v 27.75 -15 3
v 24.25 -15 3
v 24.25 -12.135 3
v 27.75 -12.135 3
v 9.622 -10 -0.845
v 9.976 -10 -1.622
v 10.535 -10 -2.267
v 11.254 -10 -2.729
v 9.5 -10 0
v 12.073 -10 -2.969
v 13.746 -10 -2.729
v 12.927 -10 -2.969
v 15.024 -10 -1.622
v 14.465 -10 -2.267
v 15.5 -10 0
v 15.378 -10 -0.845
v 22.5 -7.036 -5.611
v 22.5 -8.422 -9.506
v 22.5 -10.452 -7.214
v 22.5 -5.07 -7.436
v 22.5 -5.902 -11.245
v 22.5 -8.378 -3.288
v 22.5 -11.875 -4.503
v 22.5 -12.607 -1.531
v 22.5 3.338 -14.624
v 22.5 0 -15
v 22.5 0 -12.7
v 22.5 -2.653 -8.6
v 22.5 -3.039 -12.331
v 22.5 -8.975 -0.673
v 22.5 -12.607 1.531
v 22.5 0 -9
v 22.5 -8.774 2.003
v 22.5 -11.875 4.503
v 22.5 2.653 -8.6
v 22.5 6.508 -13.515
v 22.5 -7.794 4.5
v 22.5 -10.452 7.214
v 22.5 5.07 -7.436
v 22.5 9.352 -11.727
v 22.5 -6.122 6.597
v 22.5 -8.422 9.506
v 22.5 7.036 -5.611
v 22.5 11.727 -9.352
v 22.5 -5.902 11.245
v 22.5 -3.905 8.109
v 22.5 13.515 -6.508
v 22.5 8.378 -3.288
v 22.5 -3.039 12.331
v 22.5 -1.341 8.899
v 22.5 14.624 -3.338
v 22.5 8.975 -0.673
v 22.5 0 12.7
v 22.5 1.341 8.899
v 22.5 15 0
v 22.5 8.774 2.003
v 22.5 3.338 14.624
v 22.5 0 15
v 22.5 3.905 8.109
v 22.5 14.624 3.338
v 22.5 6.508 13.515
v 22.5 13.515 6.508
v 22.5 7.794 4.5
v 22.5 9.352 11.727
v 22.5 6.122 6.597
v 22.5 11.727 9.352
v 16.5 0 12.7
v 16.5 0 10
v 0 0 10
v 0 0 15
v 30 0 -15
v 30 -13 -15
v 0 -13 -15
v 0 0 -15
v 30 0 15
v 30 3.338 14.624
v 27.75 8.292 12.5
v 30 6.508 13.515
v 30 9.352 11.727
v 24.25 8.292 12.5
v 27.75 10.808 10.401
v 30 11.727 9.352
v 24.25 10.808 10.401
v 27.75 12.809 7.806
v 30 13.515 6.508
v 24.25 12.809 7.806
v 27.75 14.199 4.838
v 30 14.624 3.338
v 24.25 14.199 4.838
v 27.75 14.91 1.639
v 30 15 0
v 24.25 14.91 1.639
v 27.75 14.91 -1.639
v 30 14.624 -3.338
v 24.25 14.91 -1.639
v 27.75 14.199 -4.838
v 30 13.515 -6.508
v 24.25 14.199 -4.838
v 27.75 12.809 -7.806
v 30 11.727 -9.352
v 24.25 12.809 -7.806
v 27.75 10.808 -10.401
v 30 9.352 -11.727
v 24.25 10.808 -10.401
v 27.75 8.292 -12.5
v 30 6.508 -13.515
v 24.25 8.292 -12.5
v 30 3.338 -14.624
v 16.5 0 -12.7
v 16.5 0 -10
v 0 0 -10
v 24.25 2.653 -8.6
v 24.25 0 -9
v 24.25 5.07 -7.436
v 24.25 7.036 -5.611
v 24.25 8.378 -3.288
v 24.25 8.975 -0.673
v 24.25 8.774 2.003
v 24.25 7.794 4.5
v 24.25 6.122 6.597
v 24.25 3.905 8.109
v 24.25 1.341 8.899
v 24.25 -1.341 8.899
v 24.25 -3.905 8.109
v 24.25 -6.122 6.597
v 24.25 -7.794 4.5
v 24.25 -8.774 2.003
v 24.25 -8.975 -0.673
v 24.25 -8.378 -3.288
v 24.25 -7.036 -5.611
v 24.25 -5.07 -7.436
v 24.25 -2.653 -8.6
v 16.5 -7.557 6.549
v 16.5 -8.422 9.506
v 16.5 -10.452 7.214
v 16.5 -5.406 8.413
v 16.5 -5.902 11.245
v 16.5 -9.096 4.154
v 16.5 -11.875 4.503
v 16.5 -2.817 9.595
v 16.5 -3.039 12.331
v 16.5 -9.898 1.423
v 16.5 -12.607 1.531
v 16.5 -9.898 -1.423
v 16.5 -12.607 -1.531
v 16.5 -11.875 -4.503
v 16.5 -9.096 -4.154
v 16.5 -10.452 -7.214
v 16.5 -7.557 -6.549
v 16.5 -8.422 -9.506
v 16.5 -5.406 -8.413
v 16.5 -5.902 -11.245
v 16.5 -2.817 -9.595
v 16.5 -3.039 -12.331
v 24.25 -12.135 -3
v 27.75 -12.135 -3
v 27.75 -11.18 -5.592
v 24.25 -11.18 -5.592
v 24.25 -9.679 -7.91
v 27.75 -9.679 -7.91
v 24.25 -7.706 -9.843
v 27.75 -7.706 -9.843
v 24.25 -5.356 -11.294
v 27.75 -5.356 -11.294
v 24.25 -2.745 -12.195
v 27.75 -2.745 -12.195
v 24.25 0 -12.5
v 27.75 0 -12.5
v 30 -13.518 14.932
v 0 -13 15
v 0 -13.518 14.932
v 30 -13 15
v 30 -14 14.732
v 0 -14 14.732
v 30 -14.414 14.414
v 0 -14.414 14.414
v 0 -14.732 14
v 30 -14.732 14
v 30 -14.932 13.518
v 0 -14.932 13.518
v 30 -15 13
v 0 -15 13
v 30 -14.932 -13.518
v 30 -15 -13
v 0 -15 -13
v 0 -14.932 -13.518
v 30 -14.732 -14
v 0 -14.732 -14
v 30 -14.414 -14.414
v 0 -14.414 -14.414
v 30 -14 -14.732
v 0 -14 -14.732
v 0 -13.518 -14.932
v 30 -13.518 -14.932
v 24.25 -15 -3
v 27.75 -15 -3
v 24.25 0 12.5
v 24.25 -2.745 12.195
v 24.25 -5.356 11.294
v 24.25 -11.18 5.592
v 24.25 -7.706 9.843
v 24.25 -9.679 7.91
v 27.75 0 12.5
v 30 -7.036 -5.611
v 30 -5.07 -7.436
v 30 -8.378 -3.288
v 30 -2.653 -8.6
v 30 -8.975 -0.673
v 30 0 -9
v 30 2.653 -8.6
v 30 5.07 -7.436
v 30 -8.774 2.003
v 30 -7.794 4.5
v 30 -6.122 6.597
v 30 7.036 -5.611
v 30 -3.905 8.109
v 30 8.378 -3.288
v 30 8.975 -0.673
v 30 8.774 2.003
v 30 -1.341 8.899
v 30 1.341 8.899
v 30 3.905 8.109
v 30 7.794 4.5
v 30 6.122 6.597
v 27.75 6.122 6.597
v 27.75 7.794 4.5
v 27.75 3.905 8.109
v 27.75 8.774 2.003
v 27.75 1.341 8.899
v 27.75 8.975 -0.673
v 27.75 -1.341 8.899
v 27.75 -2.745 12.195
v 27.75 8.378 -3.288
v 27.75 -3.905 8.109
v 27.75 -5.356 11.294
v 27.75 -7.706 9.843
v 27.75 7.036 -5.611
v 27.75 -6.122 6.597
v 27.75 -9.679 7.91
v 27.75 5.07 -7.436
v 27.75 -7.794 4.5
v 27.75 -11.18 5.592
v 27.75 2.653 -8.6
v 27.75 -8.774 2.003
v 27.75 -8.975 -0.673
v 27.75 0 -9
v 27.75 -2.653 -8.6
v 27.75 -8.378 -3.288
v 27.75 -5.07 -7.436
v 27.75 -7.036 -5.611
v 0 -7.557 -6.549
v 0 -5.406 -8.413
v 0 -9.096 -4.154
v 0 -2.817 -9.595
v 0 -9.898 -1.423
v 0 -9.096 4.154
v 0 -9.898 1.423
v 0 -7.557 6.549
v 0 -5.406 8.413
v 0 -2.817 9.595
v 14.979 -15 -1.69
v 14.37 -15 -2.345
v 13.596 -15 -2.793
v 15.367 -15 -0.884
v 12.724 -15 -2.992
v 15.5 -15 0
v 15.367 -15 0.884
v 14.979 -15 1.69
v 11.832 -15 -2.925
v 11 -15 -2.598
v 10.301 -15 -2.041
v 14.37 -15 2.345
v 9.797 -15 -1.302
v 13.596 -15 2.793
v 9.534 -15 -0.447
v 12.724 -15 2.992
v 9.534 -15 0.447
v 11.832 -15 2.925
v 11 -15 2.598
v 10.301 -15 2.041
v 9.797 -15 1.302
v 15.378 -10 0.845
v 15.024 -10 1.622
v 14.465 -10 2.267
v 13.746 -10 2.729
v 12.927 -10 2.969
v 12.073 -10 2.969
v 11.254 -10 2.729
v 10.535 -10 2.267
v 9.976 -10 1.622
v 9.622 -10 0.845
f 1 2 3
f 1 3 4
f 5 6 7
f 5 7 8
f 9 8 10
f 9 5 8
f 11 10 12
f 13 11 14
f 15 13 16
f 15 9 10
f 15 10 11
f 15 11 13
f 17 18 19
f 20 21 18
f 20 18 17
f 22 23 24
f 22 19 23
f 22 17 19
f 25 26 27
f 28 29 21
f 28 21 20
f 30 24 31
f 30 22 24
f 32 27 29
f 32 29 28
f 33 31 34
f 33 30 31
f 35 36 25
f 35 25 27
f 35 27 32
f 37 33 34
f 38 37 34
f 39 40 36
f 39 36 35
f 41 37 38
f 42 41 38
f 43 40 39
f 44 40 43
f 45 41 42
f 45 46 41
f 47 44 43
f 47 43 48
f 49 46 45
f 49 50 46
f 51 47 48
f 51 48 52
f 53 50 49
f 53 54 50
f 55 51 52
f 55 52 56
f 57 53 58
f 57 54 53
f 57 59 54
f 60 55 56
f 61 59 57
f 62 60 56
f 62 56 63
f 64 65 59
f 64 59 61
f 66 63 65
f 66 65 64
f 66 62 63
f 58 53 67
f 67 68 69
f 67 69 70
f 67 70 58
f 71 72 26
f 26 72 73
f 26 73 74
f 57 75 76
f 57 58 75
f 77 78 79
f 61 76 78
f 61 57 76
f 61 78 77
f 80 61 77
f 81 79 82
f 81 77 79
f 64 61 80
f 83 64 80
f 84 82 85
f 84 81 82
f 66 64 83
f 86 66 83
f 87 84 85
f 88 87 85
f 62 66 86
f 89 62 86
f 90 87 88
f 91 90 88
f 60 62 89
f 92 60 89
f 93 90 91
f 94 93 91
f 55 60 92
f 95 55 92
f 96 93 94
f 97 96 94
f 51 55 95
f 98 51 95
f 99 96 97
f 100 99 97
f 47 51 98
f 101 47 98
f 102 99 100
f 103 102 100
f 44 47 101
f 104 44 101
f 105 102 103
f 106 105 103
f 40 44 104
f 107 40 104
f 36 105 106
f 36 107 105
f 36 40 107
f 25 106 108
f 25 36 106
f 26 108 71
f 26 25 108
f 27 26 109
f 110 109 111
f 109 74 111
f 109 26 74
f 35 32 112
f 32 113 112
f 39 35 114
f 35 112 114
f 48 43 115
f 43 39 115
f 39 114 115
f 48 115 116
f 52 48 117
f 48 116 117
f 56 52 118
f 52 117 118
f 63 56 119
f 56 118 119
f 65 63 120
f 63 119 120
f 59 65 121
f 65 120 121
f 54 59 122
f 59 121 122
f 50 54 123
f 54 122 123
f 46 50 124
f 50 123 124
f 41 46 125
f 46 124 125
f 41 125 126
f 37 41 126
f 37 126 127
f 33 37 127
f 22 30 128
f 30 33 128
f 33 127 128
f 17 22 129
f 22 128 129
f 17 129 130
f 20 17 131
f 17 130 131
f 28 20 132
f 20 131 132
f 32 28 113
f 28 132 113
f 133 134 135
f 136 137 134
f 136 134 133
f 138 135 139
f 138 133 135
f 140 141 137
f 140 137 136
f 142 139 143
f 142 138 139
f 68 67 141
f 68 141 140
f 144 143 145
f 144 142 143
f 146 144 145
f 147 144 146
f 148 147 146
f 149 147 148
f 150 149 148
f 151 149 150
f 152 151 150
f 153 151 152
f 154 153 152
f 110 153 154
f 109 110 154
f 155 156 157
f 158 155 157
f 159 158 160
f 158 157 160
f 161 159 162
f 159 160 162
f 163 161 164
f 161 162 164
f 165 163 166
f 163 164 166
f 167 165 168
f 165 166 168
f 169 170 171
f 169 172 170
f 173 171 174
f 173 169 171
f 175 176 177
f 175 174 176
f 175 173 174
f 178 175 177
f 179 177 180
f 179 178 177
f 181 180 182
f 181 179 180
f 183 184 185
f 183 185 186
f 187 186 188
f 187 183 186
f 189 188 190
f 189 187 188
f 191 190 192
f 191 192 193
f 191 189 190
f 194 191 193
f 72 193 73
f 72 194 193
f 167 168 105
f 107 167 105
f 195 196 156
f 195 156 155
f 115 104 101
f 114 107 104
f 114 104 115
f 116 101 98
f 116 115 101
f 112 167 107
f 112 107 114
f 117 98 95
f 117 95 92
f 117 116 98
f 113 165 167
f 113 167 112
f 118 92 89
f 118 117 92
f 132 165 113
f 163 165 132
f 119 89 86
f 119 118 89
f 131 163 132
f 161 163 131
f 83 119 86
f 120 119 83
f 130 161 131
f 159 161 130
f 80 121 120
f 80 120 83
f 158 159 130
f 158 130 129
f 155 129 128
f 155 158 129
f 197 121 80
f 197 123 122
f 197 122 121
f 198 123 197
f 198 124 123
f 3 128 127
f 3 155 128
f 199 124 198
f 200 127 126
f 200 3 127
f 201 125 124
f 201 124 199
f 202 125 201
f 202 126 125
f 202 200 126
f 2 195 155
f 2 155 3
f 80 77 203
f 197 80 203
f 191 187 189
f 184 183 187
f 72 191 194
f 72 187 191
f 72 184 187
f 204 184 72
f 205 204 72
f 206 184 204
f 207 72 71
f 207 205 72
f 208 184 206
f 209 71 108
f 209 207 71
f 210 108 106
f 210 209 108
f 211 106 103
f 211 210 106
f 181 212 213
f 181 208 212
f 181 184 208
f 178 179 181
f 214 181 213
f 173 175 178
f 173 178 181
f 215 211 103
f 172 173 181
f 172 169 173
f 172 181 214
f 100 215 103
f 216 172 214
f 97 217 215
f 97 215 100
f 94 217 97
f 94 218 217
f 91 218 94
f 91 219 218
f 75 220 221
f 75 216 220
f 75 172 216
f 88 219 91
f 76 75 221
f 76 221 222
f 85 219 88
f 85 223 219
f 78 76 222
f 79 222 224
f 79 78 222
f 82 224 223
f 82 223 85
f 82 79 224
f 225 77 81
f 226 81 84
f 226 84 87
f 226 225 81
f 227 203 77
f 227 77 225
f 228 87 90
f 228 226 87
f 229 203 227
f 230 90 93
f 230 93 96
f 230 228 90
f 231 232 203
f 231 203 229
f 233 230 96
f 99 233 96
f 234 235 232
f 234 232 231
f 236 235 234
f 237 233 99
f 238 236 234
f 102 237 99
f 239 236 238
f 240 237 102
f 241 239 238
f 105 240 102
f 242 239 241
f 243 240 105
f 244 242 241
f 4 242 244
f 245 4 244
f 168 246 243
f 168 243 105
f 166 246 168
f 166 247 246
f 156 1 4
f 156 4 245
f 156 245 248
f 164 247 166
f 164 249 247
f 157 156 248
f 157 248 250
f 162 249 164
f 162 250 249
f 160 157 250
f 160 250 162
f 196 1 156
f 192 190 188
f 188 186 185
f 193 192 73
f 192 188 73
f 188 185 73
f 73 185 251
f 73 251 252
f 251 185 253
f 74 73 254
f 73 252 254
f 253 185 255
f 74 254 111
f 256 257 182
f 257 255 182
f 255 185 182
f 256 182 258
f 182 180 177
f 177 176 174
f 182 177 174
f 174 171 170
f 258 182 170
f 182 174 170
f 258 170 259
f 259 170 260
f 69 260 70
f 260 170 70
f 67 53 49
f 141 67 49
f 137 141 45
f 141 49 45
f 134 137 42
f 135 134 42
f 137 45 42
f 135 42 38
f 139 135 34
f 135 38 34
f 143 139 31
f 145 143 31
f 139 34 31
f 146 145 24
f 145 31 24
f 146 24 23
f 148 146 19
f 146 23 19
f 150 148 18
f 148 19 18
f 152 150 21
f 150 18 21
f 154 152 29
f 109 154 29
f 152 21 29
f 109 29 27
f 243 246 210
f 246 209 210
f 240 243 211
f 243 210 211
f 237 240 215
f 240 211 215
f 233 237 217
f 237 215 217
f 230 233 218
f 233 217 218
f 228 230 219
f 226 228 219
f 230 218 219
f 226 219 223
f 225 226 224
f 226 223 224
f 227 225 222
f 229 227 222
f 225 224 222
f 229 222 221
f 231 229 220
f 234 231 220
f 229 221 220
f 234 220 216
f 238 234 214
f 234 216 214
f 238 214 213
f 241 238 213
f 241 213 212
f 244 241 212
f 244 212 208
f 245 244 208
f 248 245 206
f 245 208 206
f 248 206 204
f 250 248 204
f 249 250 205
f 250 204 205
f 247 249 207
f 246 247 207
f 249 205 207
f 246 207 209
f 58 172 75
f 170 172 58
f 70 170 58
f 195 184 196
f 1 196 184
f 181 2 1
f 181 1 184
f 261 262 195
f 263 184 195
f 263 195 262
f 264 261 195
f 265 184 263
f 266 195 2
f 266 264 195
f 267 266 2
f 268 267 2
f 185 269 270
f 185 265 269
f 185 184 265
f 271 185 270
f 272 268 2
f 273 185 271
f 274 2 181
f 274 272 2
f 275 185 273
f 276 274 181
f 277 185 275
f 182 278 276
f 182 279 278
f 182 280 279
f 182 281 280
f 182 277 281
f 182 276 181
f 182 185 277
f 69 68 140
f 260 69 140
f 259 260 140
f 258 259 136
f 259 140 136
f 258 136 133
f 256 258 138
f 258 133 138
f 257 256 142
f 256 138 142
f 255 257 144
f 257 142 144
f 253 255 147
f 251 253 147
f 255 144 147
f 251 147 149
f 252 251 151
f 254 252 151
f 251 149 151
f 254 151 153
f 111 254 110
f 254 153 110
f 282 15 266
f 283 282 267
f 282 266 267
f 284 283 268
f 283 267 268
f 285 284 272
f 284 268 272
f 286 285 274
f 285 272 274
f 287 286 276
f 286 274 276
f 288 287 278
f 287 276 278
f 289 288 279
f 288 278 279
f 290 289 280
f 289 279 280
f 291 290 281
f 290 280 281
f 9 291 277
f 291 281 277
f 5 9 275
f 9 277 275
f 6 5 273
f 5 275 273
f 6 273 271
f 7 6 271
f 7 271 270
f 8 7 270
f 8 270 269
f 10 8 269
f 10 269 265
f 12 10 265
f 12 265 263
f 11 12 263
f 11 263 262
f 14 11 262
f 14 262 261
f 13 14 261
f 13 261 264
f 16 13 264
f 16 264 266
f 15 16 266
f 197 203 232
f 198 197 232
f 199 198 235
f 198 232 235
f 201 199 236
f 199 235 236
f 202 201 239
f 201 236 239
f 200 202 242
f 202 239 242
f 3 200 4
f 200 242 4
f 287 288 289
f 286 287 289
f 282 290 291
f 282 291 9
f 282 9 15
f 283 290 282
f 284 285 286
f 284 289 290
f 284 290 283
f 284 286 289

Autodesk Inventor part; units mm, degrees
ref_plane "YZ Plane" through (0, 0, 0) normal (1, 0, 0) x (0, 1, 0)
ref_plane "XZ Plane" through (0, 0, 0) normal (0, 1, 0) x (-1, 0, 0)
ref_plane "XY Plane" through (0, 0, 0) normal (0, 0, 1) x (1, 0, 0)
sketch "スケッチ1" plane through (0, 0, 0) normal (1, 0, 0) x (0, 1, 0)
  line L0 (-15, 0) -> (-15, 15)
  line L1 (-15, 15) -> (0, 15)
  line L2 (-15, 0) -> (-15, -15)
  line L3 (-15, -15) -> (0, -15)
  arc A0 (0, -15) -> (0, 15) centre (0, 0) ccw
  dimension "d0" = 15
  dimension "d1" = 15
  dimension "d2" = 15
  dimension "d3" = 15
  dimension "d4" = 30
extrude "押し出し1" add sketch "スケッチ1" along normal blind 30
sketch "スケッチ2" plane through (30, 0, 0) normal (1, 0, 0) x (0, 0, -1)
  circle A0 centre (0, 0) radius 9
  dimension "d7" = 18
extrude "押し出し2" cut sketch "スケッチ2" against normal blind 7.5
sketch "スケッチ3" plane through (22.5, 0, 0) normal (1, 0, 0) x (0, 0, -1)
  circle A0 centre (0, 0) radius 12.7
  dimension "d10" = 25.4
extrude "押し出し3" cut sketch "スケッチ3" against normal blind 6
sketch "スケッチ4" plane through (16.5, 0, 0) normal (1, 0, 0) x (0, 0, -1)
  circle A0 centre (0, 0) radius 10
  dimension "d13" = 20
extrude "押し出し4" cut sketch "スケッチ4" against normal through all
sketch "スケッチ5" plane through (0, 0, 0) normal (-1, 0, 0) x (0, 0, 1)
  arc A0 (15, 0) -> (-15, 0) centre (0, 0) ccw
  line L0 (-15, 0) -> (15, 0)
  dimension "d16" = 30
extrude "押し出し5" cut sketch "スケッチ5" against normal blind 22.5
sketch "スケッチ6" plane through (30, 0, 0) normal (1, 0, 0) x (0, 0, -1)
  arc A0 (-12.5, 0) -> (12.5, 0) centre (0, 0) ccw
  arc A1 (15, 0) -> (-15, 0) centre (0, 0) ccw projected
  line L0 (-12.5, 0) -> (12.5, 0)
  line L1 (12.5, 0) -> (12.5, 20)
  line L2 (12.5, 20) -> (-12.5, 20)
  line L3 (-12.5, 20) -> (-12.5, 0)
  point P0 (12.5, 8.2916)
  point P1 (-12.5, 8.2916)
  dimension "d19" = 25
  dimension "d20" = 25
  dimension "d21" = 20
extrude "押し出し6" cut sketch "スケッチ6" against normal blind 5.75 contours L0 A0 | L3 A1 L1 L0
sketch "スケッチ7" plane through (30, 0, 0) normal (1, 0, 0) x (0, 0, -1)
  arc A0 (-12.5, 0) -> (12.5, 0) centre (0, 0) ccw
  arc A1 (15, 0) -> (-15, 0) centre (0, 0) ccw
  line L0 (-15, 0) -> (15, 0)
  dimension "d24" = 25
  dimension "d25" = 30
extrude "押し出し7" add sketch "スケッチ7" against normal blind 2.25
sketch "スケッチ8" plane through (30, 0, 0) normal (1, 0, 0) x (0, 0, -1)
  circle A0 centre (0, 0) radius 9
  dimension "d28" = 18
extrude "押し出し8" cut sketch "スケッチ8" against normal through all
sketch "スケッチ9" plane through (0, -15, -15) normal (0, -1, 0) x (1, 0, 0)
  line L0 (0, 15) -> (26, 15) construction
  line L1 (27.75, 12) -> (24.25, 12)
  line L2 (24.25, 12) -> (24.25, 18)
  line L3 (24.25, 18) -> (27.75, 18)
  line L4 (27.75, 18) -> (27.75, 12)
  line L5 (27.75, 12) -> (24.25, 18) construction
  line L6 (24.25, 12) -> (27.75, 18) construction
  dimension "d31" = 26
  dimension "d32" = 3.5
  dimension "d33" = 6
extrude "押し出し9" cut sketch "スケッチ9" against normal through all
sketch "スケッチ10" plane through (0, -15, -15) normal (0, -1, 0) x (1, 0, 0)
  line L0 (0, 15) -> (12.5, 15) construction
  circle A0 centre (12.5, 15) radius 3
  dimension "d36" = 12.5
  dimension "d37" = 6
extrude "押し出し10" cut sketch "スケッチ10" against normal blind 5
thread "ねじ1" size "M6x1" class "6H" standard "ANSI Metric M Profile" full length
fillet "フィレット1" radius 2 2 edges at (15, -15, -15) (15, -15, 15)
properties part number "コリメータマウント"
